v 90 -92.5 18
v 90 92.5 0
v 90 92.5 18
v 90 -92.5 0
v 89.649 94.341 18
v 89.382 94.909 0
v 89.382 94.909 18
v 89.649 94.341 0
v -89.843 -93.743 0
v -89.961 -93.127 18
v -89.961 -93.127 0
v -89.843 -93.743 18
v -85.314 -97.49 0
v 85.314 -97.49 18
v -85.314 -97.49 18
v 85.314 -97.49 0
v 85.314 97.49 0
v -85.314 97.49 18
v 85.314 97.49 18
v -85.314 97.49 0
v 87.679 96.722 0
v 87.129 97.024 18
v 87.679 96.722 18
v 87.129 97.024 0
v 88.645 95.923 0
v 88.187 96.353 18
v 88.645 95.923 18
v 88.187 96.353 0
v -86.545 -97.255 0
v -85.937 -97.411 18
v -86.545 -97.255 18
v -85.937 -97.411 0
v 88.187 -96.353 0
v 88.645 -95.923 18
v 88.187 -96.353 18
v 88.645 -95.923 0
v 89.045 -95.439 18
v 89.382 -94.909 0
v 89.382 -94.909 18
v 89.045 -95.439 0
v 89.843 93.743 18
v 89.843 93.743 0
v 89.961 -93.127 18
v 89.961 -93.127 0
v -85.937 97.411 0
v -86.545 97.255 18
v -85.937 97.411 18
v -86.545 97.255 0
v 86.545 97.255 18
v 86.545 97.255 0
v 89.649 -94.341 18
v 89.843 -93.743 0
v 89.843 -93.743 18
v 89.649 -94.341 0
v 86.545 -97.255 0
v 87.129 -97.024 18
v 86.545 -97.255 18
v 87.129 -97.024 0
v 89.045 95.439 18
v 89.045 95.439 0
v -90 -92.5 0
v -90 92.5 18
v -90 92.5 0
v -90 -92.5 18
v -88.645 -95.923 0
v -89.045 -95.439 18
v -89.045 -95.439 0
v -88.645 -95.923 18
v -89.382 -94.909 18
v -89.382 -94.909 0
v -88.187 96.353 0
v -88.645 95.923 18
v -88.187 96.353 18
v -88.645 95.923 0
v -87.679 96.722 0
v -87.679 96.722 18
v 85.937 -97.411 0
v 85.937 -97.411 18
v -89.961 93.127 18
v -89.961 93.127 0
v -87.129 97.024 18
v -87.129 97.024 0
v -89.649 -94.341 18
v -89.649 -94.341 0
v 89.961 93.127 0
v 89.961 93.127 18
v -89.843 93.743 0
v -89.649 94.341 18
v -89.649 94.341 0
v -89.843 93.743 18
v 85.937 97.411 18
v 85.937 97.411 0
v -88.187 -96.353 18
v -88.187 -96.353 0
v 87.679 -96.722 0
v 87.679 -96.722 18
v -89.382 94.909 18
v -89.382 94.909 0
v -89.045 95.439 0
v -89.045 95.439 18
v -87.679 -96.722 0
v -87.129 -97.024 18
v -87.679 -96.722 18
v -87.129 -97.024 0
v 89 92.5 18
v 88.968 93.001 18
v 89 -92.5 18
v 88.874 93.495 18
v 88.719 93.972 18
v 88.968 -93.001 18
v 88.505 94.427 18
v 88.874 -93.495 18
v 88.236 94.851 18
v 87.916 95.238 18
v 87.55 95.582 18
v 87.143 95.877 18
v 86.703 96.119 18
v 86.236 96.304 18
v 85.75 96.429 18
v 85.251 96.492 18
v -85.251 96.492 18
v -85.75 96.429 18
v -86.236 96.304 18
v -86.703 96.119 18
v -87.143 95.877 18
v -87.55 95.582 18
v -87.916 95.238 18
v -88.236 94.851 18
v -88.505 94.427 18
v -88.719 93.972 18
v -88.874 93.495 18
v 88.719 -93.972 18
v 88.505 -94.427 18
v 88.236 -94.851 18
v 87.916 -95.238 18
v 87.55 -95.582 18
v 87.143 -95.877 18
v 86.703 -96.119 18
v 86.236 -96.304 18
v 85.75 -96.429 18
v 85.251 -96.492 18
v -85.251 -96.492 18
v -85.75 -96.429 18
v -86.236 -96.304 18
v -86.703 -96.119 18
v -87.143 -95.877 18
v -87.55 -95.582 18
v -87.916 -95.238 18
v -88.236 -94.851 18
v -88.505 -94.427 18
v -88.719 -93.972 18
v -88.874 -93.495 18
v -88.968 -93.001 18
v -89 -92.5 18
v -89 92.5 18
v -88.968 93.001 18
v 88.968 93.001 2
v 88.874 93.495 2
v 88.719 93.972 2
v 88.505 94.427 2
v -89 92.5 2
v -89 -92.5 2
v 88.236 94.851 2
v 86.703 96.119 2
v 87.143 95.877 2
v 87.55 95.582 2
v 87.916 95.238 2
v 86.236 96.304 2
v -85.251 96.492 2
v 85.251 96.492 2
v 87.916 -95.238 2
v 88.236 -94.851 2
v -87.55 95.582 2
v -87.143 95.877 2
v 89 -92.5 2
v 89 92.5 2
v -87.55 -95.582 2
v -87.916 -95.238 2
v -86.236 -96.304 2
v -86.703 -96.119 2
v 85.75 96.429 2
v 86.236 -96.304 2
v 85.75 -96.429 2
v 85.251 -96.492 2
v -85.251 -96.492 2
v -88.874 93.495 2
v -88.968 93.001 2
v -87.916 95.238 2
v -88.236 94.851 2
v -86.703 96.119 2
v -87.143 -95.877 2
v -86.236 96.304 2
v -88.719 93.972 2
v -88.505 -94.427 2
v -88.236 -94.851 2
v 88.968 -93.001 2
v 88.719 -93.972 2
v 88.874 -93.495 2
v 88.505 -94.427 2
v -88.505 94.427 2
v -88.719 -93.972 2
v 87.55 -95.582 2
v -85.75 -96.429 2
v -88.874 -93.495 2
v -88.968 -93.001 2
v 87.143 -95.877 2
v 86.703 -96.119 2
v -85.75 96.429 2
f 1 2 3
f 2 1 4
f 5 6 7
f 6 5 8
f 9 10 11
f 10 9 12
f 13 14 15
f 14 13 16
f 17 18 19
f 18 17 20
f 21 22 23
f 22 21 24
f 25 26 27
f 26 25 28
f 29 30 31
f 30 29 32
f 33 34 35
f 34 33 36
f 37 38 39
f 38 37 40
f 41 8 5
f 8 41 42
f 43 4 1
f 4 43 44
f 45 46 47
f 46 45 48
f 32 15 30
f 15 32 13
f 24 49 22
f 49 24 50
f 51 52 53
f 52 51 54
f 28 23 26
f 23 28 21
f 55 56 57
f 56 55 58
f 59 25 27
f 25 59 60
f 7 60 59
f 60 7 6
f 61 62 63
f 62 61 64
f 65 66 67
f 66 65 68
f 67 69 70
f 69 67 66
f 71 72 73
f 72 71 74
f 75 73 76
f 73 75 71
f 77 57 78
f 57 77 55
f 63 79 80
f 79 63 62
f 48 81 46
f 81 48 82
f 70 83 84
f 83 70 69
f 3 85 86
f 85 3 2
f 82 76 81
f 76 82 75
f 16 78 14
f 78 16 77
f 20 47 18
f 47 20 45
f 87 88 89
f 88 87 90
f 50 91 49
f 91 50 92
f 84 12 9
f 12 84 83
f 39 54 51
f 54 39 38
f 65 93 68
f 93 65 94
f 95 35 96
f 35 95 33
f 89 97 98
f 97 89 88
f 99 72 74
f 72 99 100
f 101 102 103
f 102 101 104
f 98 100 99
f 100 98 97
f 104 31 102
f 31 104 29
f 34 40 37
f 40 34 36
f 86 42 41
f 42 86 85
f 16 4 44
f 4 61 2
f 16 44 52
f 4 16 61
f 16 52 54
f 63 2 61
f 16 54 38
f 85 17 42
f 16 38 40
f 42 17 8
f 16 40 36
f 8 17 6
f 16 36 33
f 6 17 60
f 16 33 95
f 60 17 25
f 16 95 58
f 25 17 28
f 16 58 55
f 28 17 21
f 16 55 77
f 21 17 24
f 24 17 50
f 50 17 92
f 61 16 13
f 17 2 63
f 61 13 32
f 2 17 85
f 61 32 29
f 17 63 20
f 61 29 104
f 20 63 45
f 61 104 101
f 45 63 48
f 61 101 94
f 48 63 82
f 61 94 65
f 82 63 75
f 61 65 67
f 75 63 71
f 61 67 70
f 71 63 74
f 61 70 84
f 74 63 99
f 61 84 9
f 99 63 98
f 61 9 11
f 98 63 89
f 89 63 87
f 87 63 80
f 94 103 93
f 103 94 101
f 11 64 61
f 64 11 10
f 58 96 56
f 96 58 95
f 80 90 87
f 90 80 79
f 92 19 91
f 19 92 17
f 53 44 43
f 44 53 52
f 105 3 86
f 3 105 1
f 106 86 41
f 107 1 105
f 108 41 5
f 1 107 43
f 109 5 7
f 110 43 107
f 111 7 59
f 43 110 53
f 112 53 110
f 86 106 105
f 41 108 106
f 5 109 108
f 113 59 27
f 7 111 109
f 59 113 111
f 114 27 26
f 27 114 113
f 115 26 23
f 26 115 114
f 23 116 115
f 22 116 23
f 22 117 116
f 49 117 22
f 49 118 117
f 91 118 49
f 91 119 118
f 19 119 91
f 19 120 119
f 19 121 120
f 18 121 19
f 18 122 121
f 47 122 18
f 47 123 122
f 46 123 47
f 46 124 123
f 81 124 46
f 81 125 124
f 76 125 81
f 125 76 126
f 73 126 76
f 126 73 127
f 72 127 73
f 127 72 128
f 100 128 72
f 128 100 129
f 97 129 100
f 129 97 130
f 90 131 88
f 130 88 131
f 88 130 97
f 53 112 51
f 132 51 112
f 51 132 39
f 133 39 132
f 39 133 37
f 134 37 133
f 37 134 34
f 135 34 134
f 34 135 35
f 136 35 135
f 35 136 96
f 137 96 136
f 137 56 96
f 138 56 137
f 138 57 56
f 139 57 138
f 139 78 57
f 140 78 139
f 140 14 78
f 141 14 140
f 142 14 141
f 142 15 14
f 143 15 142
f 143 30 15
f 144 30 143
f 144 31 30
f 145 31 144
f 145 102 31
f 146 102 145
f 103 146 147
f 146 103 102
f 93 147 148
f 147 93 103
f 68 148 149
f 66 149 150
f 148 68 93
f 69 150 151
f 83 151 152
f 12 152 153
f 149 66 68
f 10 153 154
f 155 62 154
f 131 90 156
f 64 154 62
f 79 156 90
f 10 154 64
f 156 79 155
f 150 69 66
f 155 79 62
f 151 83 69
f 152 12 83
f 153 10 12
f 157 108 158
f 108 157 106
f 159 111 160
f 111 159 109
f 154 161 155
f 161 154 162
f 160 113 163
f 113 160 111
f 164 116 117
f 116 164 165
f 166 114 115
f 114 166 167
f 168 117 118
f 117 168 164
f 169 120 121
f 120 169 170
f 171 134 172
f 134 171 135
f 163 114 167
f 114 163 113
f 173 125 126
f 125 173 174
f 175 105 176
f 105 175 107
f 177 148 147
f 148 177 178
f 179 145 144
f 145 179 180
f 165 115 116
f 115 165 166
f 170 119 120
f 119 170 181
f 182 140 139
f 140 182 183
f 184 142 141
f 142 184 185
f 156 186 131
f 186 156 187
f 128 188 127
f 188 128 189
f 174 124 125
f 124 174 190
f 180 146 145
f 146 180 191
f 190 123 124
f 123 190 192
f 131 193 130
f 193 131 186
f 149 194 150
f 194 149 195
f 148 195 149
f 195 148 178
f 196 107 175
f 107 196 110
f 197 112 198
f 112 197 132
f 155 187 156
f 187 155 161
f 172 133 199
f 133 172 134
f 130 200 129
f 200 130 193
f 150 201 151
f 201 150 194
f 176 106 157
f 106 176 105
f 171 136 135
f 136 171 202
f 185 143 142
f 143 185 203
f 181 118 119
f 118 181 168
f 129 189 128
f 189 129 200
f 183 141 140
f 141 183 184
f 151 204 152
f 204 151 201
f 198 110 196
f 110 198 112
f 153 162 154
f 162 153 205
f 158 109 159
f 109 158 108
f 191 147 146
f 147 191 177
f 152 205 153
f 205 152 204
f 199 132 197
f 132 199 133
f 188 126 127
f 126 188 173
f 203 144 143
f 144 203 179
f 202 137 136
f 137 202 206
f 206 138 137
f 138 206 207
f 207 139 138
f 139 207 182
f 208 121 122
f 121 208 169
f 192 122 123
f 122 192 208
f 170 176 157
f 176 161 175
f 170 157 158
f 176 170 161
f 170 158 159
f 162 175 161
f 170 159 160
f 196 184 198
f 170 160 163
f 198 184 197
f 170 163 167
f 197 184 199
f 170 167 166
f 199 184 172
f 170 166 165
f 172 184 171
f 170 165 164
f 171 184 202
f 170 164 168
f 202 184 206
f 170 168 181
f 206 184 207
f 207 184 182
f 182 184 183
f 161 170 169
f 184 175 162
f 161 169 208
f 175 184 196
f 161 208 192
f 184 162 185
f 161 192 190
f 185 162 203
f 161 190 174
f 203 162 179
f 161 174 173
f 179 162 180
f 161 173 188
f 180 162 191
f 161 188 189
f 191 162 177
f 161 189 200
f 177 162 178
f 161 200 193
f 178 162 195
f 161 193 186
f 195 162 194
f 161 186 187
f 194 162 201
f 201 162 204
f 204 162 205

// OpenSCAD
$fn = 50;


difference() {
	union() {
		hull() {
			translate(v = [-85.0000000000, 92.5000000000, 0]) {
				cylinder(h = 18, r = 5);
			}
			translate(v = [85.0000000000, 92.5000000000, 0]) {
				cylinder(h = 18, r = 5);
			}
			translate(v = [-85.0000000000, -92.5000000000, 0]) {
				cylinder(h = 18, r = 5);
			}
			translate(v = [85.0000000000, -92.5000000000, 0]) {
				cylinder(h = 18, r = 5);
			}
		}
	}
	union() {
		translate(v = [0, 0, 2]) {
			hull() {
				translate(v = [-85.0000000000, 92.5000000000, 0]) {
					cylinder(h = 16, r = 4);
				}
				translate(v = [85.0000000000, 92.5000000000, 0]) {
					cylinder(h = 16, r = 4);
				}
				translate(v = [-85.0000000000, -92.5000000000, 0]) {
					cylinder(h = 16, r = 4);
				}
				translate(v = [85.0000000000, -92.5000000000, 0]) {
					cylinder(h = 16, r = 4);
				}
			}
		}
	}
}
